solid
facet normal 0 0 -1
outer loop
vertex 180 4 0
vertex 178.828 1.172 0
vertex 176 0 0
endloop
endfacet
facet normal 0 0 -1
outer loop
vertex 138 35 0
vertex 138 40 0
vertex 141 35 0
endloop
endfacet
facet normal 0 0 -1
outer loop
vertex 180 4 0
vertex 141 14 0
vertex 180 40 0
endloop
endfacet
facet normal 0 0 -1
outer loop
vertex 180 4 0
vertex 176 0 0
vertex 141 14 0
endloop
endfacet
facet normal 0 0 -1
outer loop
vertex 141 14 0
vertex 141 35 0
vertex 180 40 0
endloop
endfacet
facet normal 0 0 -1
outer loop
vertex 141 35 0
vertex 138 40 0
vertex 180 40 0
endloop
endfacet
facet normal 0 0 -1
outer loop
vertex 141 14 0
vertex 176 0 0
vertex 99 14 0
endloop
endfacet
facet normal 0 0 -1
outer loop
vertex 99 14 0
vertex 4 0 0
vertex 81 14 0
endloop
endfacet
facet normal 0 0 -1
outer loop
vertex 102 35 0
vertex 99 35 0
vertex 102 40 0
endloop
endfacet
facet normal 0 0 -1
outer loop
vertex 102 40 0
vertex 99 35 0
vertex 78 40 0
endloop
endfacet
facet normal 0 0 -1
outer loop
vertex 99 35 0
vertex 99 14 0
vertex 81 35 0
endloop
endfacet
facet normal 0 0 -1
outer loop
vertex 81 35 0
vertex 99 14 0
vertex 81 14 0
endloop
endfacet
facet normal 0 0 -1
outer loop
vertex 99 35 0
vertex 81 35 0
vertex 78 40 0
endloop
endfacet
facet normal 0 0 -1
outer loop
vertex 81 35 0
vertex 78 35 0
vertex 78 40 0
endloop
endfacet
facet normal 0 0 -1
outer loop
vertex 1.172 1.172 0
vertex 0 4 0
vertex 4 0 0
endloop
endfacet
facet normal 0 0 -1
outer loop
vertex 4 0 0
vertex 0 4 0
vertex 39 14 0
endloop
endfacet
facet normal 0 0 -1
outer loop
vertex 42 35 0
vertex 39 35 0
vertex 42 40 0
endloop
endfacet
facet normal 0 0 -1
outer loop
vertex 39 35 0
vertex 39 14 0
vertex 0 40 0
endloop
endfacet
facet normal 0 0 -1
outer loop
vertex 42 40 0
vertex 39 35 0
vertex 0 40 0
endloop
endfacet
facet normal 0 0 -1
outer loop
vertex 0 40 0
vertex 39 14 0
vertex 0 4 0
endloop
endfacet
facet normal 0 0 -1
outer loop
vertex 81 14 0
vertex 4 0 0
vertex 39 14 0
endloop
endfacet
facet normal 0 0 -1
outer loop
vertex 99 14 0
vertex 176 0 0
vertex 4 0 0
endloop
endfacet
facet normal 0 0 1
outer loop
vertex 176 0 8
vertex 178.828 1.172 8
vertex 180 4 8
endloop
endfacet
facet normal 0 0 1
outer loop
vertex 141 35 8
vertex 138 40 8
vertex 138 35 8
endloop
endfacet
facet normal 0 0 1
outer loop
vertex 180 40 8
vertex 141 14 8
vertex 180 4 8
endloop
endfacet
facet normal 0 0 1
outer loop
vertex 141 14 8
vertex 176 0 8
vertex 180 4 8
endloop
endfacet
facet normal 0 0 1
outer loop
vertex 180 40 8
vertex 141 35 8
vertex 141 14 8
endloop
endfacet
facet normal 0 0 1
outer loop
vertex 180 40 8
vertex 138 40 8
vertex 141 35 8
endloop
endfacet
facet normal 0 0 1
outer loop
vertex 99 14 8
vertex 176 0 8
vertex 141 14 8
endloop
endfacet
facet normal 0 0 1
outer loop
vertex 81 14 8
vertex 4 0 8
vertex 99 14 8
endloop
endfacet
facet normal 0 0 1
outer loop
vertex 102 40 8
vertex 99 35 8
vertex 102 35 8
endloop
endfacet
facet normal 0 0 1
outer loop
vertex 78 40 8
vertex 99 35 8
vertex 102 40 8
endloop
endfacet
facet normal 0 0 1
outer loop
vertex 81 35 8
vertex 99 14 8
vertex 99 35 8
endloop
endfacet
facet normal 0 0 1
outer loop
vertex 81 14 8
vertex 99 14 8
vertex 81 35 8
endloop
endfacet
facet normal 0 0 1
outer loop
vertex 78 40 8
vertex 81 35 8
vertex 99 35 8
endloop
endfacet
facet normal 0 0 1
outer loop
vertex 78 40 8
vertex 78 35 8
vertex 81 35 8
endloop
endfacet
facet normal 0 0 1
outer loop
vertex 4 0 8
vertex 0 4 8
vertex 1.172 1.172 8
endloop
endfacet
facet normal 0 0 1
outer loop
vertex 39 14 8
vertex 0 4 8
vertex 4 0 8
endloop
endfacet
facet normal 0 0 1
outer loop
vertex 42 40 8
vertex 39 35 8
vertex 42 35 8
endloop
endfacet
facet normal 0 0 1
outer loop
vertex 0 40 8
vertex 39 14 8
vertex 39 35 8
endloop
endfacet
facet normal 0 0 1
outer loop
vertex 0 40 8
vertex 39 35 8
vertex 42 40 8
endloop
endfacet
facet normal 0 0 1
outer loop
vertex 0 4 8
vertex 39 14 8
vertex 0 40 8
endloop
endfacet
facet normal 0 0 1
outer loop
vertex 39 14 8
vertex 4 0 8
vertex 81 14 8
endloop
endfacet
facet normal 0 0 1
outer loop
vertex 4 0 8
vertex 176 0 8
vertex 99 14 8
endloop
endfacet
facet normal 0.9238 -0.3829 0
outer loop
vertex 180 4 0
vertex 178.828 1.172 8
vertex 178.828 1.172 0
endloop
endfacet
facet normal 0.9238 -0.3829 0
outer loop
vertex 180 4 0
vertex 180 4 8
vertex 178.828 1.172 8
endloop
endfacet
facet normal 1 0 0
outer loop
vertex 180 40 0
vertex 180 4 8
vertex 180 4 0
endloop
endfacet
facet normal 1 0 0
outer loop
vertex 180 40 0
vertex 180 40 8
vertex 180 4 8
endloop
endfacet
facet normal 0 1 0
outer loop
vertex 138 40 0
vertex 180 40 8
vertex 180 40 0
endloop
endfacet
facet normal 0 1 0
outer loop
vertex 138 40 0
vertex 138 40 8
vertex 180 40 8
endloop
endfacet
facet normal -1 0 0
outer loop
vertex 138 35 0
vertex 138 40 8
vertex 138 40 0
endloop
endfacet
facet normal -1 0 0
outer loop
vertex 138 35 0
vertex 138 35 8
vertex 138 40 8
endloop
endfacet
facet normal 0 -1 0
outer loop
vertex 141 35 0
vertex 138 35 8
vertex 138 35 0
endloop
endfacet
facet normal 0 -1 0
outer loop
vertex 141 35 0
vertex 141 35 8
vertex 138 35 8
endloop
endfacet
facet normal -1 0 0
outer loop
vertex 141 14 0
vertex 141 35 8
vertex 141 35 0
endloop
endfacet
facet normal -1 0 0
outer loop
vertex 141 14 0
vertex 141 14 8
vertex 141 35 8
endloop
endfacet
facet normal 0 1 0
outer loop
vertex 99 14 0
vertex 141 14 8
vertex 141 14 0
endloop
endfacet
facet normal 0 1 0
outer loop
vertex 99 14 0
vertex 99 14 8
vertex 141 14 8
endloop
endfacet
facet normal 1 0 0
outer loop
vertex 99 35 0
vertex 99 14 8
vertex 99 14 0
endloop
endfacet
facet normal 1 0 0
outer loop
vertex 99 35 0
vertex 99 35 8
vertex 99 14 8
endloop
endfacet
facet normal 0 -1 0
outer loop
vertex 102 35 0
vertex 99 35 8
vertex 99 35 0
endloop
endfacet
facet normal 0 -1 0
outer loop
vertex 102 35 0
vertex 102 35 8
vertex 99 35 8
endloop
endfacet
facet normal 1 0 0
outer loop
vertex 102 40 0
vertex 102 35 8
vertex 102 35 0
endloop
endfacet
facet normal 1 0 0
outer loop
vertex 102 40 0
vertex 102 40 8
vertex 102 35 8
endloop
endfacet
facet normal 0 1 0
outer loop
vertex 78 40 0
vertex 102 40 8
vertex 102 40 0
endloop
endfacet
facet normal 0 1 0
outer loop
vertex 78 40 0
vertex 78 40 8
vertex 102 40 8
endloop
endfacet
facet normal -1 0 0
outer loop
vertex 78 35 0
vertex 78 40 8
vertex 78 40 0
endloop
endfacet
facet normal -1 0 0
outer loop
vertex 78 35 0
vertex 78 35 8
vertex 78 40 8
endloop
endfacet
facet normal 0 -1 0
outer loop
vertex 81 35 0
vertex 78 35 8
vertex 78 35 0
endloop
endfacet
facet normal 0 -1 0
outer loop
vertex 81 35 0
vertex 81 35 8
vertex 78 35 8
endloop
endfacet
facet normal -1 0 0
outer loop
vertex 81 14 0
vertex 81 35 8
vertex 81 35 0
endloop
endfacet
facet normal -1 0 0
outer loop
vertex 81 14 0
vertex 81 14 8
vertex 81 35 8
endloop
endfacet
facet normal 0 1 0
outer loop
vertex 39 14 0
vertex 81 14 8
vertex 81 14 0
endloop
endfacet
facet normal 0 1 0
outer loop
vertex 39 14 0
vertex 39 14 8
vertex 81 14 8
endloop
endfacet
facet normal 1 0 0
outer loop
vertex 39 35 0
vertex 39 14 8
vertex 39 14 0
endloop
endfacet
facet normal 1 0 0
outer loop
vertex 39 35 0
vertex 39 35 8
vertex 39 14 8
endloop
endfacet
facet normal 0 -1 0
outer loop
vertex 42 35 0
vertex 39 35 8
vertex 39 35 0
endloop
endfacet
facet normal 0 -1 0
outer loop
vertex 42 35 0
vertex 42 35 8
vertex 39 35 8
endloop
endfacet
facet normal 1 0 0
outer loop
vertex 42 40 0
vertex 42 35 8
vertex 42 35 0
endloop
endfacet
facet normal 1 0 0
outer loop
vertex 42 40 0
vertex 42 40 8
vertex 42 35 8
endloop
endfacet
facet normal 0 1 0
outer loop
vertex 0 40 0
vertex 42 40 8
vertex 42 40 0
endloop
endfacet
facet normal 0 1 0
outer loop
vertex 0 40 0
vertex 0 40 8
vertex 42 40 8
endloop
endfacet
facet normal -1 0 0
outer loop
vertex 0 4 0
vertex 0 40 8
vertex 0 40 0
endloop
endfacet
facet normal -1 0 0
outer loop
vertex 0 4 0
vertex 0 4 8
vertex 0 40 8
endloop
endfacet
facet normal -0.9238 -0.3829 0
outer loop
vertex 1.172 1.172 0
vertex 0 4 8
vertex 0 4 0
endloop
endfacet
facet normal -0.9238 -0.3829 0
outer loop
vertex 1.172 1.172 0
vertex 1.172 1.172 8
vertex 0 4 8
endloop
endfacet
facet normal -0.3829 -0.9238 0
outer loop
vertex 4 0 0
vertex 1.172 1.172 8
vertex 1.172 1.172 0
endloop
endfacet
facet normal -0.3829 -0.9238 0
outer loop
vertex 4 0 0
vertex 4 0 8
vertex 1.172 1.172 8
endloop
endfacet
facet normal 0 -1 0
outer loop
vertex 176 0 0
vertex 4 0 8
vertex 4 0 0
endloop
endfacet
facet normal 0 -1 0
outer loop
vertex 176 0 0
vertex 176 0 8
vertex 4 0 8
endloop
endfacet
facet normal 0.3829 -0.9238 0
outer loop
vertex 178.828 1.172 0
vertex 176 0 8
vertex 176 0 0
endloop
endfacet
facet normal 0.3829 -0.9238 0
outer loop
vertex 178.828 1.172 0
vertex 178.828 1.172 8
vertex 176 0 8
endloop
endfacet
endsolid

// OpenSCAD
$fn = 32;

// ----------------------------------------------------------------------
// Oversize slot bar: 180 mm bar with 2 oversize windows
// ----------------------------------------------------------------------

// --- parameters (mm) ---
profile_height = 8;       // extrusion height
profile_points = 24;      // points of the closed outline

profile = [[0, 4], [1.172, 1.172], [4, 0], [176, 0], [178.828, 1.172], [180, 4], [180, 40], [138, 40], [138, 35], [141, 35], [141, 14], [99, 14], [99, 35], [102, 35], [102, 40], [78, 40], [78, 35], [81, 35], [81, 14], [39, 14], [39, 35], [42, 35], [42, 40], [0, 40]];  // single closed polygon, 24 points, counter clockwise

// --- the one profile operation ---
linear_extrude(height = profile_height) polygon(points = profile);
